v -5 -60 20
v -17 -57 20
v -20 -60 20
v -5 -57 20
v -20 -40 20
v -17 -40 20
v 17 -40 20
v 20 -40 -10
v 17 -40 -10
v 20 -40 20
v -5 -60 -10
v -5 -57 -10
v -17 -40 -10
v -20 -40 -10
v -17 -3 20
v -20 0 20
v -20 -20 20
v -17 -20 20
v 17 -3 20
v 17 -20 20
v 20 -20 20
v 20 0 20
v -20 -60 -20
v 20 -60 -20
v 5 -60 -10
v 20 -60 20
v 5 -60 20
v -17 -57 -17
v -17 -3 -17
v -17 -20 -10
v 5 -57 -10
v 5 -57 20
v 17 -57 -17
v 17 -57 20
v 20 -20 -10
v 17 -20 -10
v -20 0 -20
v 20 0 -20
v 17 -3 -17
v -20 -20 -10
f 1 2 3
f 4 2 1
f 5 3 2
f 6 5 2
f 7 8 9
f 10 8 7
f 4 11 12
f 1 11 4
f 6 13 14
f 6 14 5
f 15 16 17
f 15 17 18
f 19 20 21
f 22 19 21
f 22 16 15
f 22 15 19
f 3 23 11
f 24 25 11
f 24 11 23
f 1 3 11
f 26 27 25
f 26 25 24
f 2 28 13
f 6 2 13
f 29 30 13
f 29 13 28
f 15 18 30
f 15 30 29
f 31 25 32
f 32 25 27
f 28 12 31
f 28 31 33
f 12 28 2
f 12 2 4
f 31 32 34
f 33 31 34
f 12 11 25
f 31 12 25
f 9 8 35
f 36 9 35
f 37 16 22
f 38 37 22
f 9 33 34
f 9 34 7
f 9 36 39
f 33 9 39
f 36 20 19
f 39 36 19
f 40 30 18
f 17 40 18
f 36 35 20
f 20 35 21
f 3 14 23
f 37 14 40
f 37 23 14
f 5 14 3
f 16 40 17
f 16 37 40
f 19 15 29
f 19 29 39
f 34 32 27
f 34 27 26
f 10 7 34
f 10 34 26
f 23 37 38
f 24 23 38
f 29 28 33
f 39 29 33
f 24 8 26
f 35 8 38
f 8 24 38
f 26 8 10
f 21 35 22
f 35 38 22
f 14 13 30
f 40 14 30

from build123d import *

# Parameters (mm, degrees)
F0_W     = 40
F0_H     = 40
F1_DEPTH = 60
F2_W     = 34
F2_H     = 54
F3_DEPTH = 37
F4_W     = 20
F4_H     = 30
F5_DEPTH = 40.001
F6_W     = 10
F6_H     = 30
F7_DEPTH = 3


with BuildPart() as f1:
    # F0 (on Front) → F1 (new body)
    with BuildSketch(Plane.XZ):
        Rectangle(F0_W, F0_H)
    extrude(amount=F1_DEPTH)

    # F2 (on face) → F3 (cut, through all)
    with BuildSketch(Plane.XY.offset(20)):
        with Locations((0, -30)):
            Rectangle(F2_W, F2_H)
    extrude(amount=-F3_DEPTH, mode=Mode.SUBTRACT)

    # F4 (on face) → F5 (cut, through all)
    with BuildSketch(Plane.YZ.offset(20)):
        with Locations((-30, 5)):
            Rectangle(F4_W, F4_H)
    extrude(amount=-F5_DEPTH, mode=Mode.SUBTRACT)

    # F6 (on face) → F7 (cut, through all)
    with BuildSketch(Plane.XZ.offset(60)):
        with Locations((0, 5)):
            Rectangle(F6_W, F6_H)
    extrude(amount=-F7_DEPTH, mode=Mode.SUBTRACT)


solid = f1.part
